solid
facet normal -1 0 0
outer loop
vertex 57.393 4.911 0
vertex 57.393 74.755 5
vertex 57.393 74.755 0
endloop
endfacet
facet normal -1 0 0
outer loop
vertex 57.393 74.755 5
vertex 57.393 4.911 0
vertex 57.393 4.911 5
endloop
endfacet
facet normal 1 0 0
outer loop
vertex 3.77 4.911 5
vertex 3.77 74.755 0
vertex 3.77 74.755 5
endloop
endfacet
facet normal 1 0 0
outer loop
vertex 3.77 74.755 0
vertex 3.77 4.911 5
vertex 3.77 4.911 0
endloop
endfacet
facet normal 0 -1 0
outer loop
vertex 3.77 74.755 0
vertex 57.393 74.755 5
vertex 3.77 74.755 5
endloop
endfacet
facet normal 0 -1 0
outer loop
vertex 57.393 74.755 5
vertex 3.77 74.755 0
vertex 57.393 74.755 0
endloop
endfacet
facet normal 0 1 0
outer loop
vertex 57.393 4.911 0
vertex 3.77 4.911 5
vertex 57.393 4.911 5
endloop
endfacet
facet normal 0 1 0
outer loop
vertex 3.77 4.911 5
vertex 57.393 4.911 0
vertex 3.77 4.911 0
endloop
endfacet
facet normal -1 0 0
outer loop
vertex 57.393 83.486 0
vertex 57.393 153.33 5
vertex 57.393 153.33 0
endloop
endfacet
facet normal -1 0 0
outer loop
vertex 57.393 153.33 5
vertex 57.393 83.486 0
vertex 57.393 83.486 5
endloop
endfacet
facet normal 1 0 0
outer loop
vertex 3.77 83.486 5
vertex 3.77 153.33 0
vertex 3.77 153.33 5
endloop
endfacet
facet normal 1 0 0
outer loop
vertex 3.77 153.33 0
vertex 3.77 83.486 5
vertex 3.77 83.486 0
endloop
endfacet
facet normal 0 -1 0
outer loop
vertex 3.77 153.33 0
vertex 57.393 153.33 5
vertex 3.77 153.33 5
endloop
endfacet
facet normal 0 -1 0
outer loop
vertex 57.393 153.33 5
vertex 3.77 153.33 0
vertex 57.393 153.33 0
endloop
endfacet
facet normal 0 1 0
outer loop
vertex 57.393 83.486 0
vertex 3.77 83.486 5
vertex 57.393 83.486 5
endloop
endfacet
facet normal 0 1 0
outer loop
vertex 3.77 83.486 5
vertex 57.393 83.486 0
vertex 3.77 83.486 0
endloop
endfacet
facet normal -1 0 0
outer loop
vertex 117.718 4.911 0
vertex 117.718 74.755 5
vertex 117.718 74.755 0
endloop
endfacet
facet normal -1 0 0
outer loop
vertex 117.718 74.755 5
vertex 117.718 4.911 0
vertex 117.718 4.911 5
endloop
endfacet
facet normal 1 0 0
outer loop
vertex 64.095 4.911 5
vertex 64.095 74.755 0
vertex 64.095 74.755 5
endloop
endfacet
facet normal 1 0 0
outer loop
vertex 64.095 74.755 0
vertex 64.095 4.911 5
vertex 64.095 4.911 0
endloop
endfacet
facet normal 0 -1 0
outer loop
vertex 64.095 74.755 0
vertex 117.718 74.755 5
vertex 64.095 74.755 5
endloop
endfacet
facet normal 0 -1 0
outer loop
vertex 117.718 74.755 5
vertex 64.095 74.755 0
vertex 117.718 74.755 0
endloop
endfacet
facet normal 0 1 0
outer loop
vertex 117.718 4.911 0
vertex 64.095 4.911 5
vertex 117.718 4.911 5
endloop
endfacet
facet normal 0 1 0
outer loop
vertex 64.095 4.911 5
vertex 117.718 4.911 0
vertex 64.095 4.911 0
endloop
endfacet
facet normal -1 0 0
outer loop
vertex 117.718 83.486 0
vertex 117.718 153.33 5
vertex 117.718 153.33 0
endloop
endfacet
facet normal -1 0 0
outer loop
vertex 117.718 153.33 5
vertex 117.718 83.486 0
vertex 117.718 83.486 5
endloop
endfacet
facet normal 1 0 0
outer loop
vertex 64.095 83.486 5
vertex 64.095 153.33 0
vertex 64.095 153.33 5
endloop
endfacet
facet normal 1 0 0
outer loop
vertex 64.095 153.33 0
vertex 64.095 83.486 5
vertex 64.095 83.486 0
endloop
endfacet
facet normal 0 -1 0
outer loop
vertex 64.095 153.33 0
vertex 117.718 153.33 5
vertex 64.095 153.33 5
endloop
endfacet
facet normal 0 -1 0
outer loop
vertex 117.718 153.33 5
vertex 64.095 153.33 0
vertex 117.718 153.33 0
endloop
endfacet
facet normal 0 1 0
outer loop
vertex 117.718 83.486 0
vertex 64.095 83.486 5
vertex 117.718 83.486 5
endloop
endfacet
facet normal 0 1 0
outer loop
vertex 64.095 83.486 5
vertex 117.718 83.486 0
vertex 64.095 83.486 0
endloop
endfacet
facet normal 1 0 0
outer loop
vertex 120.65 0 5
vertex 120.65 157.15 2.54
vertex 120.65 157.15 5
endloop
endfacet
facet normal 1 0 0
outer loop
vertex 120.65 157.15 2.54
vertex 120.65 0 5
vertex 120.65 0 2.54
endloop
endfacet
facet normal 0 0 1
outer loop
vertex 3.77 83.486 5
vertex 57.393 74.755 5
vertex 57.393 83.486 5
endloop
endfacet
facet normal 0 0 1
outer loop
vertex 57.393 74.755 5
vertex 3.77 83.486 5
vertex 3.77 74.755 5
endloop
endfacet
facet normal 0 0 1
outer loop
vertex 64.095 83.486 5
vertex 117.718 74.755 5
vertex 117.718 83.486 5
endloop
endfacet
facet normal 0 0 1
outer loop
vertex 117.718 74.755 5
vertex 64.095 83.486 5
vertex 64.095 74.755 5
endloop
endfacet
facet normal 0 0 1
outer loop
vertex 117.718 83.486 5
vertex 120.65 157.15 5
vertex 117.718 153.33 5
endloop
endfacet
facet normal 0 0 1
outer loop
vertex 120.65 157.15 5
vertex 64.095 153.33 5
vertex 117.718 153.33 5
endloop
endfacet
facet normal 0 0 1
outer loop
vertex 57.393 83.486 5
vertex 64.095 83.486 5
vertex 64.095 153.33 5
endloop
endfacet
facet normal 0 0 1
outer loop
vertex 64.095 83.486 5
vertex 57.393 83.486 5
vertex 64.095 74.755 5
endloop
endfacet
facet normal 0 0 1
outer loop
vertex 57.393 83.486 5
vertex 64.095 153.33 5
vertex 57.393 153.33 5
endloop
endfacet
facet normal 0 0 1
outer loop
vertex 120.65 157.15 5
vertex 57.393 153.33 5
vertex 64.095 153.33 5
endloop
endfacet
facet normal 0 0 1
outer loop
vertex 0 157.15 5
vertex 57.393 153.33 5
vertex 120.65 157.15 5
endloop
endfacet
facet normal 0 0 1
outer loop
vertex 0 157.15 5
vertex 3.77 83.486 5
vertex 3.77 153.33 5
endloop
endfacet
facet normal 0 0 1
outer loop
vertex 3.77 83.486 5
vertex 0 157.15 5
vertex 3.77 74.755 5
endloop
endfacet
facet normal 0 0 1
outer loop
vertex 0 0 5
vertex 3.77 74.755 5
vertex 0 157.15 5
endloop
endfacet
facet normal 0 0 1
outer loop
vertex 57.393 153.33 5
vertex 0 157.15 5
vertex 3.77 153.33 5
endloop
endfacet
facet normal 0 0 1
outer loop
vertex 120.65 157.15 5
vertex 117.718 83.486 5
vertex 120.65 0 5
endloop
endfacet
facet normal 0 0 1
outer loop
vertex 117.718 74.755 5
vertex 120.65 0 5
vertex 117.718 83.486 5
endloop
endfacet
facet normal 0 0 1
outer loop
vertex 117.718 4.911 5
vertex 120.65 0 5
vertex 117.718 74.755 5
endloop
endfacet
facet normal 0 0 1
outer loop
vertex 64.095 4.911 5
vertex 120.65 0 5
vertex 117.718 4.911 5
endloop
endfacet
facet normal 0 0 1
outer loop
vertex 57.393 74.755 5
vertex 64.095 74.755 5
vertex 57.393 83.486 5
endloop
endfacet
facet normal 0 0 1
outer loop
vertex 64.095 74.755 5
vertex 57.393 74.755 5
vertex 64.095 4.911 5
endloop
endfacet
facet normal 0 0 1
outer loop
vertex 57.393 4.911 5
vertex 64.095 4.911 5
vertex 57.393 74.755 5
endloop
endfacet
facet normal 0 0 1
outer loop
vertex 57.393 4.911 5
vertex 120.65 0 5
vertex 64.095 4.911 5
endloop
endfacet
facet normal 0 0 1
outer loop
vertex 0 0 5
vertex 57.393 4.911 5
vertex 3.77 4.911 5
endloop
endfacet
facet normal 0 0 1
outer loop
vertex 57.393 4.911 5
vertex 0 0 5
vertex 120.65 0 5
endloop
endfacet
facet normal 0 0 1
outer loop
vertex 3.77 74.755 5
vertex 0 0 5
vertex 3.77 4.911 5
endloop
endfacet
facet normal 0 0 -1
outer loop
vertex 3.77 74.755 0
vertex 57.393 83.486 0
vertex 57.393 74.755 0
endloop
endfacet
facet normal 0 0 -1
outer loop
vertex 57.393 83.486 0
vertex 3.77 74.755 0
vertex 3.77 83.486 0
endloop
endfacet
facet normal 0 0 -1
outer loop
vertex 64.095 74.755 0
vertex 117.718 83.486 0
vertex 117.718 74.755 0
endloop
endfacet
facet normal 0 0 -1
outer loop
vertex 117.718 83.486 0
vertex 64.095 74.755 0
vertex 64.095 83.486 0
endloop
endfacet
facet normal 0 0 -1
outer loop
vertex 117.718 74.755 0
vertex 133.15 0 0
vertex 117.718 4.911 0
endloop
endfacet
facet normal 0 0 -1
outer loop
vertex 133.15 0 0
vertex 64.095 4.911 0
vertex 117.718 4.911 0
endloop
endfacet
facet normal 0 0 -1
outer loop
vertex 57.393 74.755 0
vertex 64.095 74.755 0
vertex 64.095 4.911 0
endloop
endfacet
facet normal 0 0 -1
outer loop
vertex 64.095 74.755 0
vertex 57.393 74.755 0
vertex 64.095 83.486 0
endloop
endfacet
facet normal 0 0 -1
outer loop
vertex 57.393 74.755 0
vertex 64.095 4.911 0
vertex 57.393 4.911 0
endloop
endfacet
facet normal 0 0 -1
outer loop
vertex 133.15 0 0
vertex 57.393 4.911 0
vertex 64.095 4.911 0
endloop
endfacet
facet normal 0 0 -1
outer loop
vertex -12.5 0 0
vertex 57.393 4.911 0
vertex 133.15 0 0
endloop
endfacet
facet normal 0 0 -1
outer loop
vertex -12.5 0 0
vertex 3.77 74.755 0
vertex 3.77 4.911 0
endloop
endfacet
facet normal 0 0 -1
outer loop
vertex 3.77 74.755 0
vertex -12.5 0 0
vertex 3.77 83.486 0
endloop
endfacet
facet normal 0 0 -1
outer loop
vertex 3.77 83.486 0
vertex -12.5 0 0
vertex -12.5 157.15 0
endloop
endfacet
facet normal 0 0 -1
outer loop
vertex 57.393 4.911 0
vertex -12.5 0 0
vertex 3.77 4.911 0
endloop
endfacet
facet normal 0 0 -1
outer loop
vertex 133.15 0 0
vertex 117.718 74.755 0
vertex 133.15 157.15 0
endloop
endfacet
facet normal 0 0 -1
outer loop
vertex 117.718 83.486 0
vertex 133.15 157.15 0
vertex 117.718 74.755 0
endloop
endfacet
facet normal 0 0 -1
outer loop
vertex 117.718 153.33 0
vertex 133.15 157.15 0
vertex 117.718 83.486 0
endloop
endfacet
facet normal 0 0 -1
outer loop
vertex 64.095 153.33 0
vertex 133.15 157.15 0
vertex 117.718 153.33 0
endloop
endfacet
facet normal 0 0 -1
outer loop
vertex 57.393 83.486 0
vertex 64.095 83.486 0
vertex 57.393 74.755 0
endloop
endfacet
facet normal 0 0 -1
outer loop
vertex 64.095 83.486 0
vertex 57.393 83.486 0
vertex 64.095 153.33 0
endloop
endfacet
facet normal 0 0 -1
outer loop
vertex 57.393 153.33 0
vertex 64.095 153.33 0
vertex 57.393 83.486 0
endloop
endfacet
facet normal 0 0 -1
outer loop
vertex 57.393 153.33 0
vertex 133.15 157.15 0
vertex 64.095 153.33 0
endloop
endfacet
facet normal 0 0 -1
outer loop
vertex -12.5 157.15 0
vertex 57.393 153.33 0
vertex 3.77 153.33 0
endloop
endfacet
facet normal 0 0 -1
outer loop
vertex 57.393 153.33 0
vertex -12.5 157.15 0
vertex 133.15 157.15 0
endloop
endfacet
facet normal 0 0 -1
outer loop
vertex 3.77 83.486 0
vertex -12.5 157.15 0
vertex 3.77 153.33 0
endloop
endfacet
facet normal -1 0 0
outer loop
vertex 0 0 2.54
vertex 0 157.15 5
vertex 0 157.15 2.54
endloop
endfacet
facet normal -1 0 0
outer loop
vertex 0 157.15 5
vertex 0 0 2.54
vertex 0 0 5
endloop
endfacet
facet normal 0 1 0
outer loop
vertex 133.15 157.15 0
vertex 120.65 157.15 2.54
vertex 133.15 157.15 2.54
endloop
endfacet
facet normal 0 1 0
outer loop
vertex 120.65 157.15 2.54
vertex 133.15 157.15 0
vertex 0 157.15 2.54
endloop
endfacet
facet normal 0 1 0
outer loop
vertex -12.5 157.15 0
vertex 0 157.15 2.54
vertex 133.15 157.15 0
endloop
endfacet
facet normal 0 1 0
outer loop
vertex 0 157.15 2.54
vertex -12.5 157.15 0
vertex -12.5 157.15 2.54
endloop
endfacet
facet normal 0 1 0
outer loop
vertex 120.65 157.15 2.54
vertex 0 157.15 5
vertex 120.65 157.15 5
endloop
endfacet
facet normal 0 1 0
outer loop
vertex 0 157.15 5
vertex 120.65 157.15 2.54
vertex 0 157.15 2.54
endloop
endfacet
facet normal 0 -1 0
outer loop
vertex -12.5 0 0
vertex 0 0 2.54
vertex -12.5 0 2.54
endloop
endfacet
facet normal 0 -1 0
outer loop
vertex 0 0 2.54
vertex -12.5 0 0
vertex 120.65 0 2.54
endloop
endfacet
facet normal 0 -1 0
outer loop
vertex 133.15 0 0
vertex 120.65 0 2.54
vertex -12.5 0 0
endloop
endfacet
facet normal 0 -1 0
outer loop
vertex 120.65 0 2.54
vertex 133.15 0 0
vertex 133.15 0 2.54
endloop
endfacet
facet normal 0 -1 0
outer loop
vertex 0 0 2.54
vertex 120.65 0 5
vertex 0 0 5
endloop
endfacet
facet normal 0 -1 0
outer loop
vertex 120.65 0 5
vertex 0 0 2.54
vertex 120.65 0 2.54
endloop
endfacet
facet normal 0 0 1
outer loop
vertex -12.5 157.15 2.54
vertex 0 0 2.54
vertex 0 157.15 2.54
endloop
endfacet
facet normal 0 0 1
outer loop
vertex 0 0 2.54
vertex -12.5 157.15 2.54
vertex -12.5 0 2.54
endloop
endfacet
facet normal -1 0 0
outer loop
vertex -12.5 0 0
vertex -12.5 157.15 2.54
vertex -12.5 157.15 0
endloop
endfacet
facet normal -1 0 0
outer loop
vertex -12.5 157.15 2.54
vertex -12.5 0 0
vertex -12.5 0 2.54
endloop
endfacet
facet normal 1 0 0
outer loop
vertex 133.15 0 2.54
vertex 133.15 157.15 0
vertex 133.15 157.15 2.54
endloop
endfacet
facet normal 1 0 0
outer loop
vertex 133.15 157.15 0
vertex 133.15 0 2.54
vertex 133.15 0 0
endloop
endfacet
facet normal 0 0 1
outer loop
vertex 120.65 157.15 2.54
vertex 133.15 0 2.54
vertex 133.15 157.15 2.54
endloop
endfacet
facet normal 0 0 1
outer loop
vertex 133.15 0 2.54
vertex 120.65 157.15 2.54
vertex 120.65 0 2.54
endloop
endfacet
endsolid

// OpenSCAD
//////////////////////////////////////////////////KeyguardWithTabs
//author: Tim Driskell
//date: 12/10/2015
/////////////////////////////////////////////////


//////////////user inputs////////////////////////

height =157.15;//desired length of the keyguard
width = 120.65;//desired width of the keyguard
depth = 5;//keyguard thickness
cols= 2;//the number of cutouts in relation to the width of the device
rows = 2;//the number of cutouts in relation to the length of the device
tab_length = 12.5; //thickness of attachment tabs.


////////////////renderings///////////////////////
keyguard();


///////////////////modules///////////////////////
module keyguard(){
    difference(){
      cube([width,height,depth]);
        inserts();
    }
    tabs();
}
module inserts(){
    //alpha changes the size of cutouts. Size of cutout is inversely proportional to alpha
    alpha=0.25;
    //creates cutouts in x-direction
    for (i=[0:cols-1]){
    //creates cutouts in y-direction
        for (j=[0:rows-1]){
    //determines location of each cutout iterations
            translate([width/cols*i+width/(cols*(2*cols+0.75*pow((1/alpha),2))),height/rows*j+height/(rows*(2*rows+0.75*pow((1/alpha),2))),-0.01])
    //cutout size proportional to size of keyguard        
            cube([width*(cols/((cols+alpha)*(cols))),height*(rows/((rows)*(rows+alpha))),depth+0.02]);
            //changing alpha increases cutout size. 
        }
    }
}

module tabs() {
    translate([-tab_length,0,0])
    cube([tab_length,height,2.54]);
    translate([width,0,0])
    cube([tab_length,height,2.54]);
}
